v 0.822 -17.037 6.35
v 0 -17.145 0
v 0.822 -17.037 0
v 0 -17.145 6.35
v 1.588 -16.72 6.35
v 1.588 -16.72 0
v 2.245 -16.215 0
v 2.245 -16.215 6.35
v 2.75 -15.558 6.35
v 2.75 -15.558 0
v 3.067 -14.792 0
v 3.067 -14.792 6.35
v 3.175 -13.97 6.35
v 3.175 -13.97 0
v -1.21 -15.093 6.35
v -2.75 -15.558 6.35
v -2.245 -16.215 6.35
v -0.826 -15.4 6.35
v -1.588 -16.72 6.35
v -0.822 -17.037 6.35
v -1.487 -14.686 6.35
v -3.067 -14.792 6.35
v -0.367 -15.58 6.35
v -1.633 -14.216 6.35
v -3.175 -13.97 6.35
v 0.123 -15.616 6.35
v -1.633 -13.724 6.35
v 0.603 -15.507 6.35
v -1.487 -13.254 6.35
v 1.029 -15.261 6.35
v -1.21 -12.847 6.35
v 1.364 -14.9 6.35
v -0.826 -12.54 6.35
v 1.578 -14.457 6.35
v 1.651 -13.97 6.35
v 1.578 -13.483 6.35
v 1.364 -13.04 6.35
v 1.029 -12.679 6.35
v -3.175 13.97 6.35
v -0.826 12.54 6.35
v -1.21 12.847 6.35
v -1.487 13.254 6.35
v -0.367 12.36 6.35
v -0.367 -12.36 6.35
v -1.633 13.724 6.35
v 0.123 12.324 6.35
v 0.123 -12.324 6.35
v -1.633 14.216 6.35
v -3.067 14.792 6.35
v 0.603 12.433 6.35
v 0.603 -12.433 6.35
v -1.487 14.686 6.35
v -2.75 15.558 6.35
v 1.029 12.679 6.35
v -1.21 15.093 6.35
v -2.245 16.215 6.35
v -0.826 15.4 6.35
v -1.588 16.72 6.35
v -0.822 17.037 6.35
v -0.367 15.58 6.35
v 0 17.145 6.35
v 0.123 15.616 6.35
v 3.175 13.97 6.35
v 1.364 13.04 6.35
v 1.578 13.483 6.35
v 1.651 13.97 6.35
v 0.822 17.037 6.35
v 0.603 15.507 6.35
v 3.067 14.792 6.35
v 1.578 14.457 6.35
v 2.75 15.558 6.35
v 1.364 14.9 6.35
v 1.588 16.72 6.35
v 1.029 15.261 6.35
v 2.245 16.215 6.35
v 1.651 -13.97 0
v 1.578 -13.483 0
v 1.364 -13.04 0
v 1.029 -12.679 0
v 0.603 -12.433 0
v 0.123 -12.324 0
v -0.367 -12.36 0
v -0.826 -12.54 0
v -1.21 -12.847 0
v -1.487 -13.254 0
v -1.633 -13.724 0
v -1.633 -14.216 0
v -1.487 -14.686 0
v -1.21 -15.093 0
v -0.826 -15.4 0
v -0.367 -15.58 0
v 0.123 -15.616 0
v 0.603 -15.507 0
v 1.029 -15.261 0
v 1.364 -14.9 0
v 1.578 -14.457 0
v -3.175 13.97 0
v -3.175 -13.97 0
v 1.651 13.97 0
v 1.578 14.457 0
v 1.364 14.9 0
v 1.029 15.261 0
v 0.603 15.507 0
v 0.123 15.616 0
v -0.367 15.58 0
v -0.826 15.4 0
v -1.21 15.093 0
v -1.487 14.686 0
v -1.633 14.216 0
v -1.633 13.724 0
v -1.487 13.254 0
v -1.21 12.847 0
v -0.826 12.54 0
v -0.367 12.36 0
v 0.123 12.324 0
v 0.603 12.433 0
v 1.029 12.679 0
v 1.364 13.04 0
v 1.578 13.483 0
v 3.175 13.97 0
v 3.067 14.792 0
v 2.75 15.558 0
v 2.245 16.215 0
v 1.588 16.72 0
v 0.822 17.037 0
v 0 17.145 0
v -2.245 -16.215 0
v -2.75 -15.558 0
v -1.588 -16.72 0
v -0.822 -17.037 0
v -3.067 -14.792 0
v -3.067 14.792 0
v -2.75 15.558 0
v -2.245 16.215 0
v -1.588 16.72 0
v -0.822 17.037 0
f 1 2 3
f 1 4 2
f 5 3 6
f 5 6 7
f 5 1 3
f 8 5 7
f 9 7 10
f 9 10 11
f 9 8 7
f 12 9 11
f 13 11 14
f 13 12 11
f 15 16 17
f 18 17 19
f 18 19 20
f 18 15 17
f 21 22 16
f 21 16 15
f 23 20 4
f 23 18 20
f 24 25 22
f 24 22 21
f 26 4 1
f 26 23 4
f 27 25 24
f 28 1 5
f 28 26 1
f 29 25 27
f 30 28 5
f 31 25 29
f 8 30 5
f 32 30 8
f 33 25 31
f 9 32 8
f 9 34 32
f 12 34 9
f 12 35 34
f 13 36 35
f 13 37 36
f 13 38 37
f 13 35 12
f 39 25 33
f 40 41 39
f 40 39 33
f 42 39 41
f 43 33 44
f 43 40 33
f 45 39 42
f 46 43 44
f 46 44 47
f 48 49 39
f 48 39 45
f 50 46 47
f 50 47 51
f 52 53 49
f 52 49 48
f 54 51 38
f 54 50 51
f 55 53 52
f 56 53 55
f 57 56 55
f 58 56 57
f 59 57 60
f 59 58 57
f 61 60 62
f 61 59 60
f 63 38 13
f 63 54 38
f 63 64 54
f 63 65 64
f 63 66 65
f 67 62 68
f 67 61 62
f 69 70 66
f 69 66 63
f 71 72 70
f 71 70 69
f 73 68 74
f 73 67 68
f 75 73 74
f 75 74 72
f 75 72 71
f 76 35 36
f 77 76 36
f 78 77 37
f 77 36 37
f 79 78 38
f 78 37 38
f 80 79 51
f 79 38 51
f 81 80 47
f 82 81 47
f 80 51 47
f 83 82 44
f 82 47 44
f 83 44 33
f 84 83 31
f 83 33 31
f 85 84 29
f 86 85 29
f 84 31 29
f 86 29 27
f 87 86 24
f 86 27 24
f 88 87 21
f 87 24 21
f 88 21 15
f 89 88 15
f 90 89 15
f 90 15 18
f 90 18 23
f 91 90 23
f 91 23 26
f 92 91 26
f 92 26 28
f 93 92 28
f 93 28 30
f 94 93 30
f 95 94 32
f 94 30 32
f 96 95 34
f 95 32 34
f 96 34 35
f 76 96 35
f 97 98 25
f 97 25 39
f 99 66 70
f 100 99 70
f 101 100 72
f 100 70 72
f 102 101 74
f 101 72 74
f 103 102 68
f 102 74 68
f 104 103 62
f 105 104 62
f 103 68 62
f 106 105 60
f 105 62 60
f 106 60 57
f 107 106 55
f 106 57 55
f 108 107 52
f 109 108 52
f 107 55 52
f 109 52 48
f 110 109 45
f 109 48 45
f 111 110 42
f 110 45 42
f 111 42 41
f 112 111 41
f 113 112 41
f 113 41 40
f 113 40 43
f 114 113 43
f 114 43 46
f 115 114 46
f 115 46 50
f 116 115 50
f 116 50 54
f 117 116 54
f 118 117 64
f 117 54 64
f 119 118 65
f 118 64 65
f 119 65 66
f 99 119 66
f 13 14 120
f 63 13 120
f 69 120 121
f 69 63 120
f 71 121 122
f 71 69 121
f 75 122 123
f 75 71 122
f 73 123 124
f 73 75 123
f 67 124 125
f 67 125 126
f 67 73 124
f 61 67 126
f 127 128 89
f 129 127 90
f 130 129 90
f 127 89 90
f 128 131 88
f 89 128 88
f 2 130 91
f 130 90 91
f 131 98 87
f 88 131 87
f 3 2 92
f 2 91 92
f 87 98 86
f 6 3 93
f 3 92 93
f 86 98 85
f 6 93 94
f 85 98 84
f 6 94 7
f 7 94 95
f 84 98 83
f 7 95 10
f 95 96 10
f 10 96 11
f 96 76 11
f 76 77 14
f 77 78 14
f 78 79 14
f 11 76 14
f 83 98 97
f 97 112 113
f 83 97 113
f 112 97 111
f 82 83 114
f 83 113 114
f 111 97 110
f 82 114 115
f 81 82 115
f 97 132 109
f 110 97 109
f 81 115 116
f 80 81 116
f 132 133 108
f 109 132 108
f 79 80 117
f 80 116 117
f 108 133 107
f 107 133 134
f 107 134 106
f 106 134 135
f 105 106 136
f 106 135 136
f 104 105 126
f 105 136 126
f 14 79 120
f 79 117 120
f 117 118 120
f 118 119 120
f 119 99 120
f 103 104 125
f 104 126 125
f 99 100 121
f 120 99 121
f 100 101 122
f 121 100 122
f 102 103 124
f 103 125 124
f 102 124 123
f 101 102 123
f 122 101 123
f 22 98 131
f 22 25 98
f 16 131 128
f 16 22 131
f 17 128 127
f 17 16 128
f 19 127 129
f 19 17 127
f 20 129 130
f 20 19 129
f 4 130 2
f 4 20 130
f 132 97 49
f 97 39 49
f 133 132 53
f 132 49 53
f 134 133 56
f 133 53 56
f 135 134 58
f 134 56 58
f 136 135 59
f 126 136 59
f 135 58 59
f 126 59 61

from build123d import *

# Parameters (mm, degrees)
F0_W     = 6.35
F0_H     = 34.29
F1_DEPTH = 6.35
F2_R     = 3.17499
F3_R     = 1.651
F4_DEPTH = 6.35


# Not quite as in the source:
# - a fillet or chamfer is up to 0.001 mm smaller than in the source, because OpenCascade refuses the exact size


with BuildPart() as f1:
    # F0 (on Top) → F1 (new body)
    with BuildSketch(Plane.XY):
        Rectangle(F0_W, F0_H)
    extrude(amount=F1_DEPTH)

    # F2 (radius 3.175 in the source; OpenCascade refuses exactly that, so slightly less here)
    f2_edges = [f1.edges().sort_by_distance(p)[0] for p in [
        (3.175, 17.145, 3.175),
        (-3.175, 17.145, 3.175),
        (3.175, -17.145, 3.175),
        (-3.175, -17.145, 3.175),
    ]]
    fillet(f2_edges, radius=F2_R)

    # F3 (on face) → F4 (cut, through all)
    with BuildSketch(Plane.XY.offset(6.35)):
        with Locations((0, -13.97)):
            Circle(F3_R)
        with Locations((0, 13.97)):
            Circle(F3_R)
    extrude(amount=-F4_DEPTH, mode=Mode.SUBTRACT)


solid = f1.part
